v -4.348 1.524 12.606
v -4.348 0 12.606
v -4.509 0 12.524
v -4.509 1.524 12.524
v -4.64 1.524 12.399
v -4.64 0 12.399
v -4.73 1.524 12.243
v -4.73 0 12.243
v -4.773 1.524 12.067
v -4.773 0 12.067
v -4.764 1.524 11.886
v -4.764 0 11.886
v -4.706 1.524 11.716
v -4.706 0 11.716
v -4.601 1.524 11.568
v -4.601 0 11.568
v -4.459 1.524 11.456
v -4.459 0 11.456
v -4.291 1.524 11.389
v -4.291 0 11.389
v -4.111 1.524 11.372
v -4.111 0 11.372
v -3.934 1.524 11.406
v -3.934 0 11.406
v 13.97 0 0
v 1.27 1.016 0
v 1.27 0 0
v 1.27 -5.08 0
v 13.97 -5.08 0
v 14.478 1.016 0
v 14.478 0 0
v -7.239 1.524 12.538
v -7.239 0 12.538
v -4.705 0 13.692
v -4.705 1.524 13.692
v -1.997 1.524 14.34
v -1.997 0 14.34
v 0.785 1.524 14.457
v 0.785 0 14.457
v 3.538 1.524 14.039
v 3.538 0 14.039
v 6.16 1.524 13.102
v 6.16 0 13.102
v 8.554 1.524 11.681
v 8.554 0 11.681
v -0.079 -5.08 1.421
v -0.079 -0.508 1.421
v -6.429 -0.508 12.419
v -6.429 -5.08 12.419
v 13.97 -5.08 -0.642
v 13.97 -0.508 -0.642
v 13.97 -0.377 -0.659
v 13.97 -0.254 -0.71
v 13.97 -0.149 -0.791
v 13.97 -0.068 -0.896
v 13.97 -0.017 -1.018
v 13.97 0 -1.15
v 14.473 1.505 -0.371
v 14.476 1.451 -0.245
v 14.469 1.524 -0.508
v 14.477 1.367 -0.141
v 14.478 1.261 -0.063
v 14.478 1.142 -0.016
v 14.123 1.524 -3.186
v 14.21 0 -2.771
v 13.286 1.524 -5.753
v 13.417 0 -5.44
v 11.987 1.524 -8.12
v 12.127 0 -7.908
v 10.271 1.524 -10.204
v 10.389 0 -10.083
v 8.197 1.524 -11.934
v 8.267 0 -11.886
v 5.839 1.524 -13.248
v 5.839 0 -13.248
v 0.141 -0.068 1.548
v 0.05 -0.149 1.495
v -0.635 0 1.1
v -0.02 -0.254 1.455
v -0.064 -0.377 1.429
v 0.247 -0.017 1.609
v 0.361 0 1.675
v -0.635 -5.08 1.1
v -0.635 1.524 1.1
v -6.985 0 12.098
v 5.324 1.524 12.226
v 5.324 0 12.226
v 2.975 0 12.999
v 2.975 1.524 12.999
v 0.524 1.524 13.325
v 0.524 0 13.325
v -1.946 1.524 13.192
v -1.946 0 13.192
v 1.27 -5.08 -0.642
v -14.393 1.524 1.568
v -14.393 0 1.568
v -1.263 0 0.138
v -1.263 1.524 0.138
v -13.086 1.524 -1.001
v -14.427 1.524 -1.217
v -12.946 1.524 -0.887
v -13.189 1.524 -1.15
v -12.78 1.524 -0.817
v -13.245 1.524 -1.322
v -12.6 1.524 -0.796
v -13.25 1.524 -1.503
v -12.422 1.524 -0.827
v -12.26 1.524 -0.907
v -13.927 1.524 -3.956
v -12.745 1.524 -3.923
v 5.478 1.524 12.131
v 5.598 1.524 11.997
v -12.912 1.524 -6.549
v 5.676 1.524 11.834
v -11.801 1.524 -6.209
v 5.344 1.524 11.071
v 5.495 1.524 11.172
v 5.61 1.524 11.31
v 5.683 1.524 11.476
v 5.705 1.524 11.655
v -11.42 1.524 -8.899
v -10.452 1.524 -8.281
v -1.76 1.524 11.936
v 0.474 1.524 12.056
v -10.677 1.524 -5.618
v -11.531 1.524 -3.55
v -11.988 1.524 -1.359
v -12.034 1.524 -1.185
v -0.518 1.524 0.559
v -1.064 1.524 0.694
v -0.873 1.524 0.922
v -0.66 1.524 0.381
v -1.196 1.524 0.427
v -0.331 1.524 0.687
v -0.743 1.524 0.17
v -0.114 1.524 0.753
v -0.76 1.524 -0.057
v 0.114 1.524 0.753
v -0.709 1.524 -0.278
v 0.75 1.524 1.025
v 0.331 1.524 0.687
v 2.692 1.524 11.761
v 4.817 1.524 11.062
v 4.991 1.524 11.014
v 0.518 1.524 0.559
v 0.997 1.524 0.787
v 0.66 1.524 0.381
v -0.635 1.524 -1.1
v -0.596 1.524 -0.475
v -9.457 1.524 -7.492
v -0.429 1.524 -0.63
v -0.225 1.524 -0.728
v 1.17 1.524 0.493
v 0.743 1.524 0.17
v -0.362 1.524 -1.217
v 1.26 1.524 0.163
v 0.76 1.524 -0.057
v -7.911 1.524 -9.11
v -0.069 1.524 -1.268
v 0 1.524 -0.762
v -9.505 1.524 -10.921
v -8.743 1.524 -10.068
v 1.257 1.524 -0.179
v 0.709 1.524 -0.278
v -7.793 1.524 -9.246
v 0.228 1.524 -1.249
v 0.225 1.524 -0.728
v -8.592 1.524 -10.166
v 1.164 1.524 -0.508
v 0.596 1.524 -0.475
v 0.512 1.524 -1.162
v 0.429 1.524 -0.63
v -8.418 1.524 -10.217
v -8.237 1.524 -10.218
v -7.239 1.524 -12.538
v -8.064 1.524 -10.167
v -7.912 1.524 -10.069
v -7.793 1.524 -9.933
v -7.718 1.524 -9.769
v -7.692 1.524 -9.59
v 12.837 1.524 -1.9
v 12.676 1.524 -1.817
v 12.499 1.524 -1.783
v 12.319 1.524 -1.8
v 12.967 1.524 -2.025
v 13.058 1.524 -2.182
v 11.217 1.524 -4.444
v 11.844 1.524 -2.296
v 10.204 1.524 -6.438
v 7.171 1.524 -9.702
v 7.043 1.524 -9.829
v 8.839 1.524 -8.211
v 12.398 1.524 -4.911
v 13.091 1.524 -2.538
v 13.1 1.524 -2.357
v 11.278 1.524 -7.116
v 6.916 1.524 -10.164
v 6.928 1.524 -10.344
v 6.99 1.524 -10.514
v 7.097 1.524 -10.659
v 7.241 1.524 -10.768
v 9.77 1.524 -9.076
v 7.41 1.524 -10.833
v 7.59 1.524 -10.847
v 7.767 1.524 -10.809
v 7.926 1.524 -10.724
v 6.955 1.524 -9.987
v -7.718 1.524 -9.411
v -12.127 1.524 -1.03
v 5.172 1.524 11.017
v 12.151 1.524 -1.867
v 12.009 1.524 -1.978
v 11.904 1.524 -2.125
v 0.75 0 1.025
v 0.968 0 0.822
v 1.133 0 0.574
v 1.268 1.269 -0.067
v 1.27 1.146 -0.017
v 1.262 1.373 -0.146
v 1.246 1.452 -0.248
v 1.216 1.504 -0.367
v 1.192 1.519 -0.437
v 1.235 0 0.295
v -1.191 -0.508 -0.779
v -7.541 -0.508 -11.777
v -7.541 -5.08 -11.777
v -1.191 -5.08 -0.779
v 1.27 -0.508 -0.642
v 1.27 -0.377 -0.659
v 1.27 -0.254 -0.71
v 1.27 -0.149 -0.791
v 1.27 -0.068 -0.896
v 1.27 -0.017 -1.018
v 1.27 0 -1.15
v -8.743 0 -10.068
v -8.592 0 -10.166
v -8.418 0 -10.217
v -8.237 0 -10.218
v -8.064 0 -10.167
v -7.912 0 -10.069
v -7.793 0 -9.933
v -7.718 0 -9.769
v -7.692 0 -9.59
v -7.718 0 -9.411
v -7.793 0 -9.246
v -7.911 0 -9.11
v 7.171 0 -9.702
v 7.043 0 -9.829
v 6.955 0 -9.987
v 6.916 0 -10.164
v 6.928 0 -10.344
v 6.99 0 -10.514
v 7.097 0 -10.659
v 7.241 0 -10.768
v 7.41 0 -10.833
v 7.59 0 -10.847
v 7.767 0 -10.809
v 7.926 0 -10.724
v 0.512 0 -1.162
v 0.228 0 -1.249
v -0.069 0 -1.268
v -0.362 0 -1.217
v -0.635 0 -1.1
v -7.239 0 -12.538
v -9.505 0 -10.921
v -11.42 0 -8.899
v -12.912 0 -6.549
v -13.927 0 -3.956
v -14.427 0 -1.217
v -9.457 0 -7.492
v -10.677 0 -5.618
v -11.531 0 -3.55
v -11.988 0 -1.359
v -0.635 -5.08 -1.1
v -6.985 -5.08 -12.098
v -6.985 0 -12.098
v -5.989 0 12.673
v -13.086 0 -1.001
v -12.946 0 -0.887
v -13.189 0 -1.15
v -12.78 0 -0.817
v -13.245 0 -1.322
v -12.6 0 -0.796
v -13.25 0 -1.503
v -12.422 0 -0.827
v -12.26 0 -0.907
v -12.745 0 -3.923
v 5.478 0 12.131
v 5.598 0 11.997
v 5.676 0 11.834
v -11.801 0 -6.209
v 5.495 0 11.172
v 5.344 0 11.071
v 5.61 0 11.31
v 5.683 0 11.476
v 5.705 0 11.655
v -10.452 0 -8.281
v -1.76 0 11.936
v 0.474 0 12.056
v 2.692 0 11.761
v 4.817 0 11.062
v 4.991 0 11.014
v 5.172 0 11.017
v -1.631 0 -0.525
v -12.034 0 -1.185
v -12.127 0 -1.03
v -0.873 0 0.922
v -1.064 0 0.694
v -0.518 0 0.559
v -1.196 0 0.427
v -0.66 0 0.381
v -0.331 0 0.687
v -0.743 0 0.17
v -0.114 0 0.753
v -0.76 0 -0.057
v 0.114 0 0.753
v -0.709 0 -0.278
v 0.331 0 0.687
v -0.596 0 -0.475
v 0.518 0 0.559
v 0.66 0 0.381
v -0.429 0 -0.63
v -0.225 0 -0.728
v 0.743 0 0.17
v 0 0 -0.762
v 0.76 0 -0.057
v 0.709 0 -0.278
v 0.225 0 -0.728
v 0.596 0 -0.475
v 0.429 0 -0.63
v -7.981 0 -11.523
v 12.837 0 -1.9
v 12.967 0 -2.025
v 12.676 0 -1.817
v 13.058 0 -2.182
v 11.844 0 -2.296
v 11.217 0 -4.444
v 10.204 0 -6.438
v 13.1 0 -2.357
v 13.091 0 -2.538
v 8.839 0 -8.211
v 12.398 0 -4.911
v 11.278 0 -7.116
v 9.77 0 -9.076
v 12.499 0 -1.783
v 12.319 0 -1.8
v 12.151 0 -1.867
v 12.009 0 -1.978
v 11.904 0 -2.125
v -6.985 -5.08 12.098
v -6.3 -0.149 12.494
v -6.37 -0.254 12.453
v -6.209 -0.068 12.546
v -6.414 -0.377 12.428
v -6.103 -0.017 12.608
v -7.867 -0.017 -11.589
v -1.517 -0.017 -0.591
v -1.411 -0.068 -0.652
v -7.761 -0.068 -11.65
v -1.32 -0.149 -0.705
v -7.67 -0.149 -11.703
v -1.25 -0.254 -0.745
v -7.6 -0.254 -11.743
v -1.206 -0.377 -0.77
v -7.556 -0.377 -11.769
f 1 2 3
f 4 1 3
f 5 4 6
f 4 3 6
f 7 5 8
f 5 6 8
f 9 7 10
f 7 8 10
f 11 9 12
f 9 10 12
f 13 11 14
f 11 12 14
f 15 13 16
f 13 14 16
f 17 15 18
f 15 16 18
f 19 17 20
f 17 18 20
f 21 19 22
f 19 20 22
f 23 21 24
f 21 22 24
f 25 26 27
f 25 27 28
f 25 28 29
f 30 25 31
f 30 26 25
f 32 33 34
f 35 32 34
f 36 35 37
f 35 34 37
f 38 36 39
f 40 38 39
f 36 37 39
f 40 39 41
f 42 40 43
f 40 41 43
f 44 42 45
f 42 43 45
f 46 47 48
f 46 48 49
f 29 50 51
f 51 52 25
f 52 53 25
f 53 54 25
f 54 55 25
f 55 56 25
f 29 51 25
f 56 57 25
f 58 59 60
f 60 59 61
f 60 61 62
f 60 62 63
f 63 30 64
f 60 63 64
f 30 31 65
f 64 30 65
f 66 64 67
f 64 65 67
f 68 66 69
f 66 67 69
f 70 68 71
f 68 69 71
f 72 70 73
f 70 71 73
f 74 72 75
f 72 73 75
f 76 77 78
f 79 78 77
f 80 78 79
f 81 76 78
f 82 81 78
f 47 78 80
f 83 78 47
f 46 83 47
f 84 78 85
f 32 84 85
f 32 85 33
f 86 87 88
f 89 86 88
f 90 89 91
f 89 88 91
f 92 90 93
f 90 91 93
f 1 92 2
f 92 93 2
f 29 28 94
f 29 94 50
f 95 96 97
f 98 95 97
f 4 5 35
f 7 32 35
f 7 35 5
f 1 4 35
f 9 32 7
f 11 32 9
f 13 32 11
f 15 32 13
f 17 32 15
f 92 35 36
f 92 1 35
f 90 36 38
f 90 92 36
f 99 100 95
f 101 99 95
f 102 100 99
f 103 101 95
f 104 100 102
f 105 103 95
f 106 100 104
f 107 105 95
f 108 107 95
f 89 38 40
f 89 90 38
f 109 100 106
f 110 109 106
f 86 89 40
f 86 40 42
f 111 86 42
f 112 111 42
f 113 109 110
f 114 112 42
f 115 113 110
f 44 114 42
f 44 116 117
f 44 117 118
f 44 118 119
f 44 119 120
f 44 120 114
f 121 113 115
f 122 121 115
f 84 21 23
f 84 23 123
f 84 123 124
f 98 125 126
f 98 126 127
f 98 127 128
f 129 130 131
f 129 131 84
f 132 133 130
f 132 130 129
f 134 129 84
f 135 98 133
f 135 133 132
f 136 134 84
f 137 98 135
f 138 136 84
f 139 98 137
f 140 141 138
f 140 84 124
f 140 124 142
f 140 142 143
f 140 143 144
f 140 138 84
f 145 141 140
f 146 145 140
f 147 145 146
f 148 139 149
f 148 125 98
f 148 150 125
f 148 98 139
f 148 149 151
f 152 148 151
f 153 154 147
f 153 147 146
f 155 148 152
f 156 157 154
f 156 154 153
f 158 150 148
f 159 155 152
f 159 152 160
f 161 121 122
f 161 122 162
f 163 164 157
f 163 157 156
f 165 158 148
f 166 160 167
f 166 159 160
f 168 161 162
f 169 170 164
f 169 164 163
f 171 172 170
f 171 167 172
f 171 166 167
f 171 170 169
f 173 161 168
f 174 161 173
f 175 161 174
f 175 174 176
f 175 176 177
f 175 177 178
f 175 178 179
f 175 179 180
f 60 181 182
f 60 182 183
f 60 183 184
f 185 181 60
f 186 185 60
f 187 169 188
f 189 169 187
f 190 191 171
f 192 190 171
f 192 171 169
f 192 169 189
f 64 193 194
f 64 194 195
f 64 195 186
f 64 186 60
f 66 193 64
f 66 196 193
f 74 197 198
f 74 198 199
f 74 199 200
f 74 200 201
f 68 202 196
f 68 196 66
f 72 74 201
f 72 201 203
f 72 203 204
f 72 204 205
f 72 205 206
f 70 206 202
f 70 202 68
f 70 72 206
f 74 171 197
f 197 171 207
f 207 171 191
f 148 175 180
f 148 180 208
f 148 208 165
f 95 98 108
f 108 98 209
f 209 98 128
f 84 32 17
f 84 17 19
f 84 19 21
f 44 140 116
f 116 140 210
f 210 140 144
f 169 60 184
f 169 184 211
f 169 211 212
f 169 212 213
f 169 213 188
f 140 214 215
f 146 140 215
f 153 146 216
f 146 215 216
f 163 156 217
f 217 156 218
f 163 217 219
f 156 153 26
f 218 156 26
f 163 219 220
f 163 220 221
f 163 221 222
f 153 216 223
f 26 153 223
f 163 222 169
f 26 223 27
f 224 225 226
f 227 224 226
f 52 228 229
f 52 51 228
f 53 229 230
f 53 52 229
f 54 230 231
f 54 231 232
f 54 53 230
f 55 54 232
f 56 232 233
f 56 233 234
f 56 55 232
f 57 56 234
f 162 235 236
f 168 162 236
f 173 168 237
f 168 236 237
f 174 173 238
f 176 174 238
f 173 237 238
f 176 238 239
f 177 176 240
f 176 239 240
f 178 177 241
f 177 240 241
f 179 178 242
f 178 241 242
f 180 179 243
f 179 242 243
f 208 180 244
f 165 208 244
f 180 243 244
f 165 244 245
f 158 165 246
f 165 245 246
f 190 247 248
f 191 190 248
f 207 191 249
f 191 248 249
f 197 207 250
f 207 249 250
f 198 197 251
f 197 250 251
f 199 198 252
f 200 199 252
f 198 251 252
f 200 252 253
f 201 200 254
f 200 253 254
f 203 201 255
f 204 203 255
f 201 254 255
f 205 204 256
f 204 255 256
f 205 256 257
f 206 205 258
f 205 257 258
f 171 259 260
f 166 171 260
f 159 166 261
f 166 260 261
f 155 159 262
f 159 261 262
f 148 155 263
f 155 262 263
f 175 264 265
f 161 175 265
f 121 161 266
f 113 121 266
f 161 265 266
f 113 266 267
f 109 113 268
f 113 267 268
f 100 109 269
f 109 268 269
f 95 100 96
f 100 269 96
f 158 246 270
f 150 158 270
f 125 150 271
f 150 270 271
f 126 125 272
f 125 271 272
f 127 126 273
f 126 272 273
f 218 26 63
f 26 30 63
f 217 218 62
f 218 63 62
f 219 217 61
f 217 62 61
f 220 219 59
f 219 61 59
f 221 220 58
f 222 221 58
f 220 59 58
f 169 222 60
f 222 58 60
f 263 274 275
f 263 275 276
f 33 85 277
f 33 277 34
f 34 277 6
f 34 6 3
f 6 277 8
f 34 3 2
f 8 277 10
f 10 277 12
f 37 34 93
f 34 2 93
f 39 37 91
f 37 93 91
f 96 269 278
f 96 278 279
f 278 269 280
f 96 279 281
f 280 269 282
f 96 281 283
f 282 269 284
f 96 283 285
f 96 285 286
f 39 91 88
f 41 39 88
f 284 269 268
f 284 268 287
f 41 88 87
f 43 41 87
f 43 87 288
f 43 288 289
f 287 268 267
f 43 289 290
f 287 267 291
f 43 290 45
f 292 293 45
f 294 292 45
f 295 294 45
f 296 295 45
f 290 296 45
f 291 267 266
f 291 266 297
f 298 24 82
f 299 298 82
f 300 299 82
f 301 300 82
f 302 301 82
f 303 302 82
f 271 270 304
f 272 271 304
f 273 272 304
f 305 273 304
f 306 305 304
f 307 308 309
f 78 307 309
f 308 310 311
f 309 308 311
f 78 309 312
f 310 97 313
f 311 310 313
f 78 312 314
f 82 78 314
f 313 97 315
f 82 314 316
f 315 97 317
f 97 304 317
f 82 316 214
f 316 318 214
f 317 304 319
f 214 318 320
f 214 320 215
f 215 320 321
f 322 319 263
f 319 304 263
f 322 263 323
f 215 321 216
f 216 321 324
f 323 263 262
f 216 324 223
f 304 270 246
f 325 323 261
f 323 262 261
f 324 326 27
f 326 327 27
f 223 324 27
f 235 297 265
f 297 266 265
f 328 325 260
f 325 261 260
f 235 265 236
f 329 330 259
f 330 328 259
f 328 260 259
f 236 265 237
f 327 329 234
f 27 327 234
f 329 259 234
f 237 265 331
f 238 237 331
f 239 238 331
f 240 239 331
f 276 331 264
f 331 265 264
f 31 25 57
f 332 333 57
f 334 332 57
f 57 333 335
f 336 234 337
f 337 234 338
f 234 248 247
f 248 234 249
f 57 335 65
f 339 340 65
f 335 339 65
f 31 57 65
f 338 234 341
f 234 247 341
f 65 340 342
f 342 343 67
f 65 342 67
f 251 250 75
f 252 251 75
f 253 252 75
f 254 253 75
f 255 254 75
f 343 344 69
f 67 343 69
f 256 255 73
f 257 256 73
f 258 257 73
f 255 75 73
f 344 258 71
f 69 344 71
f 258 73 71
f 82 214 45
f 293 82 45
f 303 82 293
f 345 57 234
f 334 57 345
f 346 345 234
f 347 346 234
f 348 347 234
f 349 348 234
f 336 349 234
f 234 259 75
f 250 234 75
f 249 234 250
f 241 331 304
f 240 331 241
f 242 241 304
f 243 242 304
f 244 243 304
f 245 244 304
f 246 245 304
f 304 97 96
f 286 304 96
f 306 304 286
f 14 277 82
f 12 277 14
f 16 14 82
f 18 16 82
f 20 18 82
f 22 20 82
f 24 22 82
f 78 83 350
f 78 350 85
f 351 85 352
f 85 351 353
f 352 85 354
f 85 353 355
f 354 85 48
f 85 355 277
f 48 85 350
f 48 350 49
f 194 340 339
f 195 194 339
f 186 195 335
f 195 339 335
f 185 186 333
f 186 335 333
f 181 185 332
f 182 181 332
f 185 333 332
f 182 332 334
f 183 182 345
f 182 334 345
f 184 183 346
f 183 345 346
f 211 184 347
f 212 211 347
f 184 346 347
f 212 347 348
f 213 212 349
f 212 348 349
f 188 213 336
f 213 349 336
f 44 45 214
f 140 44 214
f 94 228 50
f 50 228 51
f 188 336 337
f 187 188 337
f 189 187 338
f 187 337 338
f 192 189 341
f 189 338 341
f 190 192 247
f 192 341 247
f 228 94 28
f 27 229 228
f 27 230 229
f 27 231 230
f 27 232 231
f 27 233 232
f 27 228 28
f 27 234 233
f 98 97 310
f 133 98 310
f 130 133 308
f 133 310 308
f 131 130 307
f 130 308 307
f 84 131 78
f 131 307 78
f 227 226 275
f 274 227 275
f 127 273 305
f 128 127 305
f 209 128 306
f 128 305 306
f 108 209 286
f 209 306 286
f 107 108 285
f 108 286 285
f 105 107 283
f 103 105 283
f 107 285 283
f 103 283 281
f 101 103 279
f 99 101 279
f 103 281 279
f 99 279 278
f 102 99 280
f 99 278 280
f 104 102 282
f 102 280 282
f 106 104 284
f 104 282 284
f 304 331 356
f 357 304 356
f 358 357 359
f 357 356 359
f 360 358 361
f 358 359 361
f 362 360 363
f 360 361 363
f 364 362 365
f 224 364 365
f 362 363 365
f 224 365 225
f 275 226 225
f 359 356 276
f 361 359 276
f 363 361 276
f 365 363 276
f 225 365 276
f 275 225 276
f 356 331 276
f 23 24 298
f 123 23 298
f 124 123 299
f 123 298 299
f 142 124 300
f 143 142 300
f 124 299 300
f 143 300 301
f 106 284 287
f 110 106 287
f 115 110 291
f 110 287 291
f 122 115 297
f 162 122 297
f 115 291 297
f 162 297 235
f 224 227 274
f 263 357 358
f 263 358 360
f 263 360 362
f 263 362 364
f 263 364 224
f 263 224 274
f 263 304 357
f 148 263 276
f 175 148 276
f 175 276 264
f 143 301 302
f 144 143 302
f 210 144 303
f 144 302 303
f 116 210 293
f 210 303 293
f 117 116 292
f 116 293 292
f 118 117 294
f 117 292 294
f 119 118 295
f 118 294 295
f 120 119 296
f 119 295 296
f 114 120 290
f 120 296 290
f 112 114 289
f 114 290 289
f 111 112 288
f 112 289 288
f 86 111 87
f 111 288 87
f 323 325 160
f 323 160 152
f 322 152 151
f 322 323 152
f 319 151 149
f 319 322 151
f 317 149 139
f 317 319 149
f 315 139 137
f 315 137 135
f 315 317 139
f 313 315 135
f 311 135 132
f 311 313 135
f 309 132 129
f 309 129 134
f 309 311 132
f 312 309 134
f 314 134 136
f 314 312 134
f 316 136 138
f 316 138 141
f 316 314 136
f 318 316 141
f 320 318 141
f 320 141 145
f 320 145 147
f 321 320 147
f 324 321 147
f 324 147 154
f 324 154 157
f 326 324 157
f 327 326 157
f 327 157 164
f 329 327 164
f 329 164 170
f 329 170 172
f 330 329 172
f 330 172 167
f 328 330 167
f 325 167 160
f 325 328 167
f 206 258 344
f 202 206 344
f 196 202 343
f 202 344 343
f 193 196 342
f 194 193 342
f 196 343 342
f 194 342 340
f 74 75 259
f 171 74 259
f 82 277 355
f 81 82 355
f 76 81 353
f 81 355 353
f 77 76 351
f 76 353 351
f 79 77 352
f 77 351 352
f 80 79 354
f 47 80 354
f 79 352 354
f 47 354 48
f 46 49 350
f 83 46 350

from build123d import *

# Parameters (mm, degrees)
SKETCH1_R           = 0.762
BOSS_EXTRUDE1_DEPTH = 1.524
SKETCH2_W           = 12.7
SKETCH2_H           = 0.641845345
BOSS_EXTRUDE2_DEPTH = 5.08
FILLET1_R           = 0.508
CIRPATTERN1_START   = -13.97
CIRPATTERN1_DEPTH   = 12.7
CIRPATTERN1_2_DEPTH = 12.7


# Read off the part's stored shape, not the designer's step: CirPattern1
with BuildPart() as part:
    # Sketch1 → Boss-Extrude1 (new body)
    with BuildSketch(Plane(origin=(0, 0, 0), x_dir=(1, 0, 0), z_dir=(0, 1, 0))):
        with BuildLine():
            Line((1.27, 0), (14.478, 0))
            ThreePointArc((14.478, 0), (12.127384736, 7.908161825), (5.838820078, 13.248421193))
            Line((5.838820078, 13.248421193), (0.5121772, 1.16214221))
            ThreePointArc((0.5121772, 1.16214221), (-0.068857603, 1.268131945), (-0.635, 1.099852263))
            Line((-0.635, 1.099852263), (-7.239, 12.538315796))
            ThreePointArc((-7.239, 12.538315796), (-12.912361406, 6.548542351), (-14.392879352, -1.56764408))
            Line((-14.392879352, -1.56764408), (-1.262533276, -0.137512639))
            ThreePointArc((-1.262533276, -0.137512639), (-1.063805679, -0.693698406), (-0.635, -1.099852263))
            Line((-0.635, -1.099852263), (-7.239, -12.538315796))
            ThreePointArc((-7.239, -12.538315796), (0.78497667, -14.456704176), (8.554059274, -11.680777112))
            Line((8.554059274, -11.680777112), (0.750356077, -1.024629571))
            ThreePointArc((0.750356077, -1.024629571), (1.132663281, -0.57443354), (1.27, 0))
        make_face()
        with Locations(Location((0, 0, 0), (0, 0, 90))):
            Circle(SKETCH1_R, mode=Mode.SUBTRACT)
        with BuildLine():
            ThreePointArc((13.091283697, 2.537817206), (12.588737673, 1.793574306), (11.844494773, 2.296120329))
            ThreePointArc((11.844494773, 2.296120329), (10.203630871, 6.438178474), (7.171403907, 9.702329153))
            ThreePointArc((7.171403907, 9.702329153), (7.038197315, 10.590420367), (7.926288529, 10.723626959))
            ThreePointArc((7.926288529, 10.723626959), (11.277697278, 7.115881471), (13.091283697, 2.537817206))
        make_face(mode=Mode.SUBTRACT)
        with BuildLine():
            ThreePointArc((-4.347827678, -12.606292852), (-4.741087925, -11.79895378), (-3.933748852, -11.405693533))
            ThreePointArc((-3.933748852, -11.405693533), (0.473810677, -12.055692782), (4.816761569, -11.061782541))
            ThreePointArc((4.816761569, -11.061782541), (5.652474417, -11.390467855), (5.323789103, -12.226180703))
            ThreePointArc((5.323789103, -12.226180703), (0.523685485, -13.324713074), (-4.347827678, -12.606292852))
        make_face(mode=Mode.SUBTRACT)
        with BuildLine():
            ThreePointArc((-8.743456019, 10.068475647), (-7.847649749, 10.005379474), (-7.910745922, 9.109573204))
            ThreePointArc((-7.910745922, 9.109573204), (-10.677441547, 5.617514308), (-11.988165476, 1.359453388))
            ThreePointArc((-11.988165476, 1.359453388), (-12.690671732, 0.800047488), (-13.250077632, 1.502553744))
            ThreePointArc((-13.250077632, 1.502553744), (-11.801382763, 6.208831604), (-8.743456019, 10.068475647))
        make_face(mode=Mode.SUBTRACT)
    extrude(amount=BOSS_EXTRUDE1_DEPTH)

    # Sketch2 → Boss-Extrude2 (add)
    with BuildSketch(Plane.XZ):
        with Locations((7.62, -0.320922673)):
            Rectangle(SKETCH2_W, SKETCH2_H)
    extrude(amount=BOSS_EXTRUDE2_DEPTH)

    # Fillet1
    fillet1_edges = [part.edges().sort_by_distance(p)[0] for p in [
        (7.62, 0, -0.641845345),
        (7.874, 1.524, 0),
    ]]
    fillet(fillet1_edges, radius=FILLET1_R)

    # CirPattern1 outline → CirPattern1 (add)
    with BuildSketch(Plane(origin=(0, 0, 0), x_dir=(0.8660254037844362, 0, -0.5000000000000042), z_dir=(0.5000000000000042, 0, 0.8660254037844363)).offset(CIRPATTERN1_START)):
        with BuildLine():
            Line((-0.641845345, -0.508), (-0.641845345, -5.08))
            Line((-0.641845345, -5.08), (0, -5.08))
            Line((0, -5.08), (0, 0))
            Line((0, 0), (-1.149845345, 0))
            ThreePointArc((-1.149845345, 0), (-0.7906351, -0.148789755), (-0.641845345, -0.508))
        make_face()
    extrude(amount=CIRPATTERN1_DEPTH)

    # CirPattern1 2 outline → CirPattern1 2 (add)
    with BuildSketch(Plane(origin=(0, 0, 0), x_dir=(0.8660254037844431, 0, 0.4999999999999921), z_dir=(0.4999999999999921, 0, -0.8660254037844433)).offset(CIRPATTERN1_START)):
        with BuildLine():
            Line((0.641845345, 0.508), (0.641845345, 5.08))
            Line((0.641845345, 5.08), (0, 5.08))
            Line((0, 5.08), (0, 0))
            Line((0, 0), (1.149845345, 0))
            ThreePointArc((1.149845345, 0), (0.7906351, 0.148789755), (0.641845345, 0.508))
        make_face()
    extrude(amount=CIRPATTERN1_2_DEPTH)


solid = part.part
